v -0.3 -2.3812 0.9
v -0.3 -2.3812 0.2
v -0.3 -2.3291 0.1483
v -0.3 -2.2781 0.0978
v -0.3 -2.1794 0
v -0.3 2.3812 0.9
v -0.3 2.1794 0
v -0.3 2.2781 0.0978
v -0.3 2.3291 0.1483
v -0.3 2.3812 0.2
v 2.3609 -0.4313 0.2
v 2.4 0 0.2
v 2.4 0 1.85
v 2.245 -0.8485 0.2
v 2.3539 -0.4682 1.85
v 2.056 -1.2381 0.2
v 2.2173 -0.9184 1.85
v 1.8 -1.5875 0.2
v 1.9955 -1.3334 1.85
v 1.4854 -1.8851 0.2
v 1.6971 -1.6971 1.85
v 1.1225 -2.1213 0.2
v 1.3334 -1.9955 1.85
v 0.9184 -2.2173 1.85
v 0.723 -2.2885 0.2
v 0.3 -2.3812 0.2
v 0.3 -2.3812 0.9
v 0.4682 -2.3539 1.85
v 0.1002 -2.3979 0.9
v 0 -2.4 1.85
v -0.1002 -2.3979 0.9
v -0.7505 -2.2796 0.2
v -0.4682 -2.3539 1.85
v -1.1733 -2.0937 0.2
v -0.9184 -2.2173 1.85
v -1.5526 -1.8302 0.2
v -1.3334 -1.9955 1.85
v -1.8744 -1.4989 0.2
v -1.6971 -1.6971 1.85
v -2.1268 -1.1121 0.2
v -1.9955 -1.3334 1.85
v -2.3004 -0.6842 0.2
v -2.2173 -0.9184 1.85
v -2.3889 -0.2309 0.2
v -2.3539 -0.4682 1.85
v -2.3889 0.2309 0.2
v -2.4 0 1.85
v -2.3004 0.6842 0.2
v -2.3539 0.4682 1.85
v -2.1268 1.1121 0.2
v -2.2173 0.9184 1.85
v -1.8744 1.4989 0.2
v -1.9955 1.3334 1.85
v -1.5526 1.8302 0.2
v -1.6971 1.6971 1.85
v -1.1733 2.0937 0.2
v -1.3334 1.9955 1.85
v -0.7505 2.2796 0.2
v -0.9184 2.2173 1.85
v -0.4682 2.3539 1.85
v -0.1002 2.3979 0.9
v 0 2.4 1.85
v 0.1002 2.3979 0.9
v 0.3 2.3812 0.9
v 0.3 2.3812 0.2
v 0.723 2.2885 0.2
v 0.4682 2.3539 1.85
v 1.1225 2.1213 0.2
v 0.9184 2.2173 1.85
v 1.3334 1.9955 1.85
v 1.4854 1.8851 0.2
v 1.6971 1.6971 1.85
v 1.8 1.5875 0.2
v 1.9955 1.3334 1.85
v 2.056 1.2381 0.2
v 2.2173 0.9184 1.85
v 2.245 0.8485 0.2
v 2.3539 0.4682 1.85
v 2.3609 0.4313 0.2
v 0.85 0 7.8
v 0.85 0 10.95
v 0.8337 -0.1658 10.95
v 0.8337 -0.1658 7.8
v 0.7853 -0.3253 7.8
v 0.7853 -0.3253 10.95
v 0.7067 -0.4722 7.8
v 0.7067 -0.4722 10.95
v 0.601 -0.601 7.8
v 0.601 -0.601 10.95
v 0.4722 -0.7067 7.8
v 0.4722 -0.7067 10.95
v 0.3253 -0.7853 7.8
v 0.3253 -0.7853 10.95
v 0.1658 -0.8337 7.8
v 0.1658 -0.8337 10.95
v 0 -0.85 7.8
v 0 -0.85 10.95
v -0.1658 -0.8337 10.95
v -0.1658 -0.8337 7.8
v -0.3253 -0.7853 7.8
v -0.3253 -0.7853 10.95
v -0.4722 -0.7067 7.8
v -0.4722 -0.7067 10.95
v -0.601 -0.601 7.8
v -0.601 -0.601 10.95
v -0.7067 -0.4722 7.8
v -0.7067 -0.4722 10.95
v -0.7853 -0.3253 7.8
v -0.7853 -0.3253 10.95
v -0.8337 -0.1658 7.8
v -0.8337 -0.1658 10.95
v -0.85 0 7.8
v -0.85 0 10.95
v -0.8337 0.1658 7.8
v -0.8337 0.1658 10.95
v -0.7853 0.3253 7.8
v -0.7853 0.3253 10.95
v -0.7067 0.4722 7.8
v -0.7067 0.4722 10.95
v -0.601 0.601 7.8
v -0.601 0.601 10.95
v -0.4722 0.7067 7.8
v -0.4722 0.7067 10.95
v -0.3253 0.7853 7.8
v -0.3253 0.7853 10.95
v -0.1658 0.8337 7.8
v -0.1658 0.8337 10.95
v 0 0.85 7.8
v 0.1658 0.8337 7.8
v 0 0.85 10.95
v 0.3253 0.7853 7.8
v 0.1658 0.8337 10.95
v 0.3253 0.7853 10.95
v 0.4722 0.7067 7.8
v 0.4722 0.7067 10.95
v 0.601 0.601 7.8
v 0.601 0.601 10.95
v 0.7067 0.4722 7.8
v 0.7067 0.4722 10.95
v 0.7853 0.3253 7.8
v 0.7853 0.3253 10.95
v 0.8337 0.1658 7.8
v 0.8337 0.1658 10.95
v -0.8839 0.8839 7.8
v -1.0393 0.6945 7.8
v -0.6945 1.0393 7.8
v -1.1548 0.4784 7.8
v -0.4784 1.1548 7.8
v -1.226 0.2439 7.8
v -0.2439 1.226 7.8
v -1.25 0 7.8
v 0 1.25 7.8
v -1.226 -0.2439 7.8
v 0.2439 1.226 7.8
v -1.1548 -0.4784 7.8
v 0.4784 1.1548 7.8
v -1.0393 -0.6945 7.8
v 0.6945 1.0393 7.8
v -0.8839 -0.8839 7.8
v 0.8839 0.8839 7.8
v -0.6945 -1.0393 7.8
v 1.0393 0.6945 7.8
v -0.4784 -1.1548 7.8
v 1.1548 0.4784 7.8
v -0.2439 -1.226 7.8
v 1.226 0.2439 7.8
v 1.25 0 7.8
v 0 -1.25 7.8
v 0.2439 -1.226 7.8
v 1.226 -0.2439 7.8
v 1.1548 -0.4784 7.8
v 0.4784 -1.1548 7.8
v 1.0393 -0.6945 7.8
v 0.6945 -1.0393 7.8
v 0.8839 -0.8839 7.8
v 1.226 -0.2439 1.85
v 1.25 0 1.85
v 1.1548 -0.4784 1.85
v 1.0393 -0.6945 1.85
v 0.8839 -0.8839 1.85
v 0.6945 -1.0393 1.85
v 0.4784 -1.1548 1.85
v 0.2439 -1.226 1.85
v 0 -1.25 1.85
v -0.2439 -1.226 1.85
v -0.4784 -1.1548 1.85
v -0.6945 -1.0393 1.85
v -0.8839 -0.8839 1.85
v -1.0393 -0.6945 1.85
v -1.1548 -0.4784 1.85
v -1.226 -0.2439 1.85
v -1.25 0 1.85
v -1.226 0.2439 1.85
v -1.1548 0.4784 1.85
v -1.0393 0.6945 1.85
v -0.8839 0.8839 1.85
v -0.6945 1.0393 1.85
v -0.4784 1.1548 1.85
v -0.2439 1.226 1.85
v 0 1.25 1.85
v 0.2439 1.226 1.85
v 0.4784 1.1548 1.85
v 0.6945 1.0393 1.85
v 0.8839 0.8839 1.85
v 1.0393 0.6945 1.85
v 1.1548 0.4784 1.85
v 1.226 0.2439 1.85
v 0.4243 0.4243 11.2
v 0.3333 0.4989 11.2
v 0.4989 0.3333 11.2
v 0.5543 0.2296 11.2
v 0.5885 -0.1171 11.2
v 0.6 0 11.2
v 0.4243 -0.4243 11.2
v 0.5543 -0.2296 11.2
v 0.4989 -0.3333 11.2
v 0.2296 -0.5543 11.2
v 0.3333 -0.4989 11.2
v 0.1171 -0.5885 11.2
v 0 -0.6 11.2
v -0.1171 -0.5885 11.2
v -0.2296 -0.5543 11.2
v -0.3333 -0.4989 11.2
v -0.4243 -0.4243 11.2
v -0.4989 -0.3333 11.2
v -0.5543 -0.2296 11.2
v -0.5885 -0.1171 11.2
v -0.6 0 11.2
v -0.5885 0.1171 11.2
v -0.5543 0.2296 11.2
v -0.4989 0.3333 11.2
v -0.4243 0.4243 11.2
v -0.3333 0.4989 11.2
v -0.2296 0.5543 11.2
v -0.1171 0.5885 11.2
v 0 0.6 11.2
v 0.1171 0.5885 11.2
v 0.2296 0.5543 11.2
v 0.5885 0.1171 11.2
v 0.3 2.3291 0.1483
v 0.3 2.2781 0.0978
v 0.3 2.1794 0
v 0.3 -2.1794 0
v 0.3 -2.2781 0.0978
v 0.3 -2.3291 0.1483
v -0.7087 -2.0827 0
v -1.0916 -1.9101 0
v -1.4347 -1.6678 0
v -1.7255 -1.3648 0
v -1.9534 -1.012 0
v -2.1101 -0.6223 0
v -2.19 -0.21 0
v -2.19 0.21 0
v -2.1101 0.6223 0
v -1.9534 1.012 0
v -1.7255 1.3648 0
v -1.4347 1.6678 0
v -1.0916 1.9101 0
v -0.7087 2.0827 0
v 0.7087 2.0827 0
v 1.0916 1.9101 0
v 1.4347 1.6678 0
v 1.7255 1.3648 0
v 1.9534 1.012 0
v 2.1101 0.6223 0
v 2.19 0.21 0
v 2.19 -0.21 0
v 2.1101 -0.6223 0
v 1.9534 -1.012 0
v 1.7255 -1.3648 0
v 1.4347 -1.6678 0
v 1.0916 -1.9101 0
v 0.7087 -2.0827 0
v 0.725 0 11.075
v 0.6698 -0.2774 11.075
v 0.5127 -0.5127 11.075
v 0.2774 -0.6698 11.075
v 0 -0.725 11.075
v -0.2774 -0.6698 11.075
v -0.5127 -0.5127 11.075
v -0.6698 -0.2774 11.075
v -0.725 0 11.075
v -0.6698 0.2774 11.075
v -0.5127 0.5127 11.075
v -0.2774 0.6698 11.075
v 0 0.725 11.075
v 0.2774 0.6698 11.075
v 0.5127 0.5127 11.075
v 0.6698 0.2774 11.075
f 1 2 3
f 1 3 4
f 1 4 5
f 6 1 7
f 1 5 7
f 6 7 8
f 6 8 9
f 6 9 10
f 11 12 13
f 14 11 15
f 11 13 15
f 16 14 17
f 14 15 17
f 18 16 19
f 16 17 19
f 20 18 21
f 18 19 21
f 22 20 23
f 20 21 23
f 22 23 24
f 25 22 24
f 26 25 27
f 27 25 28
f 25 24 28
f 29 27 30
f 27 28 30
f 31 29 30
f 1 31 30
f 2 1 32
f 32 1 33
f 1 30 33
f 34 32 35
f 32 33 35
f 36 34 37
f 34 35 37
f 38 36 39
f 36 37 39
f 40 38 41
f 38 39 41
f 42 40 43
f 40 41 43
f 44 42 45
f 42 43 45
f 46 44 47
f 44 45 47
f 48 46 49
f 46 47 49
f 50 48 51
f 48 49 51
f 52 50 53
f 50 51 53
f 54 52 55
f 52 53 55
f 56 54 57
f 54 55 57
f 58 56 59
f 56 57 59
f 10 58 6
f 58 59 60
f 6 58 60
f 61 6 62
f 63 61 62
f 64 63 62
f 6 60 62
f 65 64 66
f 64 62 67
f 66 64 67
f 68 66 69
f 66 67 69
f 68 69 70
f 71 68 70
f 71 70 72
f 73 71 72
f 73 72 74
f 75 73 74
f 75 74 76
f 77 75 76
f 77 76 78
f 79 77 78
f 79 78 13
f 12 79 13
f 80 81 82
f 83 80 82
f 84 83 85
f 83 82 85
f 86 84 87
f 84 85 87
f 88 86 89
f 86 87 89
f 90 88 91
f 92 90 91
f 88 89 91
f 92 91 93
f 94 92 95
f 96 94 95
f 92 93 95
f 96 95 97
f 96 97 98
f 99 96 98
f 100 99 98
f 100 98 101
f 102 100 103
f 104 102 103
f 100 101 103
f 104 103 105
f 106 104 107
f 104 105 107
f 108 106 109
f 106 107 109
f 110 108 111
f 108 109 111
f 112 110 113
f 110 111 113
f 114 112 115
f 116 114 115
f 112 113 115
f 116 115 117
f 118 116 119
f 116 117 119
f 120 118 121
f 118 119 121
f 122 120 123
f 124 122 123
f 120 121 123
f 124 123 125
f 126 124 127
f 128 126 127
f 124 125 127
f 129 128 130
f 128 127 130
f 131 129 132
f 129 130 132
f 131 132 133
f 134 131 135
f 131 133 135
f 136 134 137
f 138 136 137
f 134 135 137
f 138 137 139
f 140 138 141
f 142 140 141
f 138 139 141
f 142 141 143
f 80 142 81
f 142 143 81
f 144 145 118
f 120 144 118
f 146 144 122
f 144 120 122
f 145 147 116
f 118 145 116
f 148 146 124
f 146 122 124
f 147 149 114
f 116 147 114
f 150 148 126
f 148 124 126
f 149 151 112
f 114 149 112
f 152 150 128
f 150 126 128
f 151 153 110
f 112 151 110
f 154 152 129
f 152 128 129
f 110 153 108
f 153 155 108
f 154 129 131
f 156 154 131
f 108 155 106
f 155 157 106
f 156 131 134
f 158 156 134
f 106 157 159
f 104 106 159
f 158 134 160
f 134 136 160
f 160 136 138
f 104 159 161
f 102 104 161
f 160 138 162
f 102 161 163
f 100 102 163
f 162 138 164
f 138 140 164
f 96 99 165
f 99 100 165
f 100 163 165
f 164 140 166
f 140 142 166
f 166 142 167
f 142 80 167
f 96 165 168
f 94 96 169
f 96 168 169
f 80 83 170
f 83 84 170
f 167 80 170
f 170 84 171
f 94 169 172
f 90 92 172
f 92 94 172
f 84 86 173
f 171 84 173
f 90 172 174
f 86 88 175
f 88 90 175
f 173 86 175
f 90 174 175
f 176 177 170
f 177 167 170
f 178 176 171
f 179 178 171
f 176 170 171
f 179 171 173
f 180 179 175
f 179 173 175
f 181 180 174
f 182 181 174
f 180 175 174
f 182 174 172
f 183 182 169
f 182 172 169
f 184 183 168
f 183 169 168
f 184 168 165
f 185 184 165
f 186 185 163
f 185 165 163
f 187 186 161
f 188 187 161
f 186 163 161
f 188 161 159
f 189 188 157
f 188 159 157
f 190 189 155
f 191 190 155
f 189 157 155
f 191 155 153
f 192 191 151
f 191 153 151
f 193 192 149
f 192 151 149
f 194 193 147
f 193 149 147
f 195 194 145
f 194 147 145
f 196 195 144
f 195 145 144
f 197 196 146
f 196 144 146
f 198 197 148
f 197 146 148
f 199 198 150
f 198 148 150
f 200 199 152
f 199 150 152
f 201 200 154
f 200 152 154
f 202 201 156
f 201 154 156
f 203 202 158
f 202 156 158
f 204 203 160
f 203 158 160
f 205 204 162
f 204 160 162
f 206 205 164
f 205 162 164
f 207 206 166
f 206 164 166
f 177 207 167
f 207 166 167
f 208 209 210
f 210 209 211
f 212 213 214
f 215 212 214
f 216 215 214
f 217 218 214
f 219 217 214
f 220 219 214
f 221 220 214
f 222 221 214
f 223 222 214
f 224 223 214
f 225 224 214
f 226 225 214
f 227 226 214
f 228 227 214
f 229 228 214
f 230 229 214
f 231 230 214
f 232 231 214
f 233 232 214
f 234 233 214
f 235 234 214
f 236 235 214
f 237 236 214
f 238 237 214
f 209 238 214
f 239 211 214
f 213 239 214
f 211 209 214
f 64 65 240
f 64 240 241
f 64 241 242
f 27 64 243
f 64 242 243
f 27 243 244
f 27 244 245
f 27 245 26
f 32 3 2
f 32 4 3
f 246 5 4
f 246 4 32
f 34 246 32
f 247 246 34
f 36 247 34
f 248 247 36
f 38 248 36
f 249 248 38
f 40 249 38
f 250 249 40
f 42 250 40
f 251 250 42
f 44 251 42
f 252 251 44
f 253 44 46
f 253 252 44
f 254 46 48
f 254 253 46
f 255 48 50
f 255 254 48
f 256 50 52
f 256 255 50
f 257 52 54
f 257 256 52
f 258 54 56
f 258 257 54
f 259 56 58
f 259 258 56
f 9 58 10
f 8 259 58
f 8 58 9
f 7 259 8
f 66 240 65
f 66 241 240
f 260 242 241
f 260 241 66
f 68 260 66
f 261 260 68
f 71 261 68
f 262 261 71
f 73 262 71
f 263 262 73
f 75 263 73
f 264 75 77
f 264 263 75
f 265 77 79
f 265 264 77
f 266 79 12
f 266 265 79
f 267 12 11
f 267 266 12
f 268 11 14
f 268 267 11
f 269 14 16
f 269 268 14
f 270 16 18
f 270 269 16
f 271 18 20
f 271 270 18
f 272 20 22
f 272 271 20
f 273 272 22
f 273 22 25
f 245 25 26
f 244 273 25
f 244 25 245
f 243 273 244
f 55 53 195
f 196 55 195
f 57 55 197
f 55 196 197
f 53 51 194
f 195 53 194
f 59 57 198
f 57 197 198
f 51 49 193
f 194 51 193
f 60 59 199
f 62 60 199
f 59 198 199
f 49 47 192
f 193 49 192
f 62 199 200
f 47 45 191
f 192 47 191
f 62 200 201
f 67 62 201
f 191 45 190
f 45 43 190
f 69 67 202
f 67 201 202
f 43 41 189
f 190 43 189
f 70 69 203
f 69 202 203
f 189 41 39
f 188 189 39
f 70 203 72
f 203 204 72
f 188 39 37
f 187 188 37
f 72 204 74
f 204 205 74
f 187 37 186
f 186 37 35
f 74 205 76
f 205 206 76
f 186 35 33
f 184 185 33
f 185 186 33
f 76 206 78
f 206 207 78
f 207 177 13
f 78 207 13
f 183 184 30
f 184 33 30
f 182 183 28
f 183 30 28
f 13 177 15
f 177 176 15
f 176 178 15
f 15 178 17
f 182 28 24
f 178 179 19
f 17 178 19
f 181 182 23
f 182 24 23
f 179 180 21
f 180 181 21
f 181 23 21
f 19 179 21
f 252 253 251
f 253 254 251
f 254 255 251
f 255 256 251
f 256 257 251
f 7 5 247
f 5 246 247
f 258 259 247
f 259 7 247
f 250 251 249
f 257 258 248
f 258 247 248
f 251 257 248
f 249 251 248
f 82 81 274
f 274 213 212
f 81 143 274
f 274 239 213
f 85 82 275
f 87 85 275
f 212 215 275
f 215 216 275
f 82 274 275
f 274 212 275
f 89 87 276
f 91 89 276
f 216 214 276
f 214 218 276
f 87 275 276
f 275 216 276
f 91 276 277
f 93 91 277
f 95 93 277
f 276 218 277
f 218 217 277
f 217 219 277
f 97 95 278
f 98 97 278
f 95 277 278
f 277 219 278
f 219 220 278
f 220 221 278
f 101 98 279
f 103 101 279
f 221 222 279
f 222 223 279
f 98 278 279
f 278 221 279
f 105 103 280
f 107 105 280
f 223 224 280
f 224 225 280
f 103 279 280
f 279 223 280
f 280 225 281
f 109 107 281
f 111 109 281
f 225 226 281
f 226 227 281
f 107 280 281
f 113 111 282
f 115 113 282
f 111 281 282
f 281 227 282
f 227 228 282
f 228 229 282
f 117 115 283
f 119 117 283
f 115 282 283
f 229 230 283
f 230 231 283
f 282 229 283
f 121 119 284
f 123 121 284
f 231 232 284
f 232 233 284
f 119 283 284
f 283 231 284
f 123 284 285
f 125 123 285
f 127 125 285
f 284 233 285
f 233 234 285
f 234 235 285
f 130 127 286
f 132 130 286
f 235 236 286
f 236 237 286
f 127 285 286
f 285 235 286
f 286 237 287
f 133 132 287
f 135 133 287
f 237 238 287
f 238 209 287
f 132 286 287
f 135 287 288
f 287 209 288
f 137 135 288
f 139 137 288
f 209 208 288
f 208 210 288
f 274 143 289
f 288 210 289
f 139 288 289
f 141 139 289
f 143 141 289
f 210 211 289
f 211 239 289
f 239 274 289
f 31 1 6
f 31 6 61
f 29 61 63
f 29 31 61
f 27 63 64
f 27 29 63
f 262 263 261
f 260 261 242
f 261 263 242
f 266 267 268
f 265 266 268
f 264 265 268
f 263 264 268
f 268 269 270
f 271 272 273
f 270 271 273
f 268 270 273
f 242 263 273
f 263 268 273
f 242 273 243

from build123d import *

# Parameters (mm, degrees)
F2_SIZE  = 0.25
F4_DEPTH = 0.9
F5_SIZE  = 0.2


with BuildPart() as f1:
    # F0 (on Front) → F1 (revolve)
    with BuildSketch(Plane.XZ):
        Polygon((0, 11.2), (0, 0), (2.4, 0), (2.4, 1.85), (1.25, 1.85), (1.25, 7.8), (0.85, 7.8), (0.85, 11.2), align=None)
    revolve(axis=Axis((0, 0, 5.6), (0, 0, -1)))

    # F2
    f2_edges = [f1.edges().sort_by_distance(p)[0] for p in [
        (-0.85, 0, 11.2),
    ]]
    chamfer(f2_edges, length=F2_SIZE)

    # F3 (on face) → F4 (cut)
    with BuildSketch(Plane(origin=(0, 0, 0), x_dir=(1, 0, 0), z_dir=(0, 0, -1))):
        with BuildLine():
            ThreePointArc((0.3, 2.38117618), (0, 2.4), (-0.3, 2.38117618))
            Line((-0.3, 2.38117618), (-0.3, -2.38117618))
            ThreePointArc((-0.3, -2.38117618), (0, -2.4), (0.3, -2.38117618))
            Line((0.3, -2.38117618), (0.3, 2.38117618))
        make_face()
    extrude(amount=-F4_DEPTH, mode=Mode.SUBTRACT)

    # F5
    f5_edges = [f1.edges().sort_by_distance(p)[0] for p in [
        (1.8, 1.587451, 0),
        (1.8, -1.587451, 0),
        (-2.4, 0, 0),
    ]]
    chamfer(f5_edges, length=F5_SIZE)


solid = f1.part
